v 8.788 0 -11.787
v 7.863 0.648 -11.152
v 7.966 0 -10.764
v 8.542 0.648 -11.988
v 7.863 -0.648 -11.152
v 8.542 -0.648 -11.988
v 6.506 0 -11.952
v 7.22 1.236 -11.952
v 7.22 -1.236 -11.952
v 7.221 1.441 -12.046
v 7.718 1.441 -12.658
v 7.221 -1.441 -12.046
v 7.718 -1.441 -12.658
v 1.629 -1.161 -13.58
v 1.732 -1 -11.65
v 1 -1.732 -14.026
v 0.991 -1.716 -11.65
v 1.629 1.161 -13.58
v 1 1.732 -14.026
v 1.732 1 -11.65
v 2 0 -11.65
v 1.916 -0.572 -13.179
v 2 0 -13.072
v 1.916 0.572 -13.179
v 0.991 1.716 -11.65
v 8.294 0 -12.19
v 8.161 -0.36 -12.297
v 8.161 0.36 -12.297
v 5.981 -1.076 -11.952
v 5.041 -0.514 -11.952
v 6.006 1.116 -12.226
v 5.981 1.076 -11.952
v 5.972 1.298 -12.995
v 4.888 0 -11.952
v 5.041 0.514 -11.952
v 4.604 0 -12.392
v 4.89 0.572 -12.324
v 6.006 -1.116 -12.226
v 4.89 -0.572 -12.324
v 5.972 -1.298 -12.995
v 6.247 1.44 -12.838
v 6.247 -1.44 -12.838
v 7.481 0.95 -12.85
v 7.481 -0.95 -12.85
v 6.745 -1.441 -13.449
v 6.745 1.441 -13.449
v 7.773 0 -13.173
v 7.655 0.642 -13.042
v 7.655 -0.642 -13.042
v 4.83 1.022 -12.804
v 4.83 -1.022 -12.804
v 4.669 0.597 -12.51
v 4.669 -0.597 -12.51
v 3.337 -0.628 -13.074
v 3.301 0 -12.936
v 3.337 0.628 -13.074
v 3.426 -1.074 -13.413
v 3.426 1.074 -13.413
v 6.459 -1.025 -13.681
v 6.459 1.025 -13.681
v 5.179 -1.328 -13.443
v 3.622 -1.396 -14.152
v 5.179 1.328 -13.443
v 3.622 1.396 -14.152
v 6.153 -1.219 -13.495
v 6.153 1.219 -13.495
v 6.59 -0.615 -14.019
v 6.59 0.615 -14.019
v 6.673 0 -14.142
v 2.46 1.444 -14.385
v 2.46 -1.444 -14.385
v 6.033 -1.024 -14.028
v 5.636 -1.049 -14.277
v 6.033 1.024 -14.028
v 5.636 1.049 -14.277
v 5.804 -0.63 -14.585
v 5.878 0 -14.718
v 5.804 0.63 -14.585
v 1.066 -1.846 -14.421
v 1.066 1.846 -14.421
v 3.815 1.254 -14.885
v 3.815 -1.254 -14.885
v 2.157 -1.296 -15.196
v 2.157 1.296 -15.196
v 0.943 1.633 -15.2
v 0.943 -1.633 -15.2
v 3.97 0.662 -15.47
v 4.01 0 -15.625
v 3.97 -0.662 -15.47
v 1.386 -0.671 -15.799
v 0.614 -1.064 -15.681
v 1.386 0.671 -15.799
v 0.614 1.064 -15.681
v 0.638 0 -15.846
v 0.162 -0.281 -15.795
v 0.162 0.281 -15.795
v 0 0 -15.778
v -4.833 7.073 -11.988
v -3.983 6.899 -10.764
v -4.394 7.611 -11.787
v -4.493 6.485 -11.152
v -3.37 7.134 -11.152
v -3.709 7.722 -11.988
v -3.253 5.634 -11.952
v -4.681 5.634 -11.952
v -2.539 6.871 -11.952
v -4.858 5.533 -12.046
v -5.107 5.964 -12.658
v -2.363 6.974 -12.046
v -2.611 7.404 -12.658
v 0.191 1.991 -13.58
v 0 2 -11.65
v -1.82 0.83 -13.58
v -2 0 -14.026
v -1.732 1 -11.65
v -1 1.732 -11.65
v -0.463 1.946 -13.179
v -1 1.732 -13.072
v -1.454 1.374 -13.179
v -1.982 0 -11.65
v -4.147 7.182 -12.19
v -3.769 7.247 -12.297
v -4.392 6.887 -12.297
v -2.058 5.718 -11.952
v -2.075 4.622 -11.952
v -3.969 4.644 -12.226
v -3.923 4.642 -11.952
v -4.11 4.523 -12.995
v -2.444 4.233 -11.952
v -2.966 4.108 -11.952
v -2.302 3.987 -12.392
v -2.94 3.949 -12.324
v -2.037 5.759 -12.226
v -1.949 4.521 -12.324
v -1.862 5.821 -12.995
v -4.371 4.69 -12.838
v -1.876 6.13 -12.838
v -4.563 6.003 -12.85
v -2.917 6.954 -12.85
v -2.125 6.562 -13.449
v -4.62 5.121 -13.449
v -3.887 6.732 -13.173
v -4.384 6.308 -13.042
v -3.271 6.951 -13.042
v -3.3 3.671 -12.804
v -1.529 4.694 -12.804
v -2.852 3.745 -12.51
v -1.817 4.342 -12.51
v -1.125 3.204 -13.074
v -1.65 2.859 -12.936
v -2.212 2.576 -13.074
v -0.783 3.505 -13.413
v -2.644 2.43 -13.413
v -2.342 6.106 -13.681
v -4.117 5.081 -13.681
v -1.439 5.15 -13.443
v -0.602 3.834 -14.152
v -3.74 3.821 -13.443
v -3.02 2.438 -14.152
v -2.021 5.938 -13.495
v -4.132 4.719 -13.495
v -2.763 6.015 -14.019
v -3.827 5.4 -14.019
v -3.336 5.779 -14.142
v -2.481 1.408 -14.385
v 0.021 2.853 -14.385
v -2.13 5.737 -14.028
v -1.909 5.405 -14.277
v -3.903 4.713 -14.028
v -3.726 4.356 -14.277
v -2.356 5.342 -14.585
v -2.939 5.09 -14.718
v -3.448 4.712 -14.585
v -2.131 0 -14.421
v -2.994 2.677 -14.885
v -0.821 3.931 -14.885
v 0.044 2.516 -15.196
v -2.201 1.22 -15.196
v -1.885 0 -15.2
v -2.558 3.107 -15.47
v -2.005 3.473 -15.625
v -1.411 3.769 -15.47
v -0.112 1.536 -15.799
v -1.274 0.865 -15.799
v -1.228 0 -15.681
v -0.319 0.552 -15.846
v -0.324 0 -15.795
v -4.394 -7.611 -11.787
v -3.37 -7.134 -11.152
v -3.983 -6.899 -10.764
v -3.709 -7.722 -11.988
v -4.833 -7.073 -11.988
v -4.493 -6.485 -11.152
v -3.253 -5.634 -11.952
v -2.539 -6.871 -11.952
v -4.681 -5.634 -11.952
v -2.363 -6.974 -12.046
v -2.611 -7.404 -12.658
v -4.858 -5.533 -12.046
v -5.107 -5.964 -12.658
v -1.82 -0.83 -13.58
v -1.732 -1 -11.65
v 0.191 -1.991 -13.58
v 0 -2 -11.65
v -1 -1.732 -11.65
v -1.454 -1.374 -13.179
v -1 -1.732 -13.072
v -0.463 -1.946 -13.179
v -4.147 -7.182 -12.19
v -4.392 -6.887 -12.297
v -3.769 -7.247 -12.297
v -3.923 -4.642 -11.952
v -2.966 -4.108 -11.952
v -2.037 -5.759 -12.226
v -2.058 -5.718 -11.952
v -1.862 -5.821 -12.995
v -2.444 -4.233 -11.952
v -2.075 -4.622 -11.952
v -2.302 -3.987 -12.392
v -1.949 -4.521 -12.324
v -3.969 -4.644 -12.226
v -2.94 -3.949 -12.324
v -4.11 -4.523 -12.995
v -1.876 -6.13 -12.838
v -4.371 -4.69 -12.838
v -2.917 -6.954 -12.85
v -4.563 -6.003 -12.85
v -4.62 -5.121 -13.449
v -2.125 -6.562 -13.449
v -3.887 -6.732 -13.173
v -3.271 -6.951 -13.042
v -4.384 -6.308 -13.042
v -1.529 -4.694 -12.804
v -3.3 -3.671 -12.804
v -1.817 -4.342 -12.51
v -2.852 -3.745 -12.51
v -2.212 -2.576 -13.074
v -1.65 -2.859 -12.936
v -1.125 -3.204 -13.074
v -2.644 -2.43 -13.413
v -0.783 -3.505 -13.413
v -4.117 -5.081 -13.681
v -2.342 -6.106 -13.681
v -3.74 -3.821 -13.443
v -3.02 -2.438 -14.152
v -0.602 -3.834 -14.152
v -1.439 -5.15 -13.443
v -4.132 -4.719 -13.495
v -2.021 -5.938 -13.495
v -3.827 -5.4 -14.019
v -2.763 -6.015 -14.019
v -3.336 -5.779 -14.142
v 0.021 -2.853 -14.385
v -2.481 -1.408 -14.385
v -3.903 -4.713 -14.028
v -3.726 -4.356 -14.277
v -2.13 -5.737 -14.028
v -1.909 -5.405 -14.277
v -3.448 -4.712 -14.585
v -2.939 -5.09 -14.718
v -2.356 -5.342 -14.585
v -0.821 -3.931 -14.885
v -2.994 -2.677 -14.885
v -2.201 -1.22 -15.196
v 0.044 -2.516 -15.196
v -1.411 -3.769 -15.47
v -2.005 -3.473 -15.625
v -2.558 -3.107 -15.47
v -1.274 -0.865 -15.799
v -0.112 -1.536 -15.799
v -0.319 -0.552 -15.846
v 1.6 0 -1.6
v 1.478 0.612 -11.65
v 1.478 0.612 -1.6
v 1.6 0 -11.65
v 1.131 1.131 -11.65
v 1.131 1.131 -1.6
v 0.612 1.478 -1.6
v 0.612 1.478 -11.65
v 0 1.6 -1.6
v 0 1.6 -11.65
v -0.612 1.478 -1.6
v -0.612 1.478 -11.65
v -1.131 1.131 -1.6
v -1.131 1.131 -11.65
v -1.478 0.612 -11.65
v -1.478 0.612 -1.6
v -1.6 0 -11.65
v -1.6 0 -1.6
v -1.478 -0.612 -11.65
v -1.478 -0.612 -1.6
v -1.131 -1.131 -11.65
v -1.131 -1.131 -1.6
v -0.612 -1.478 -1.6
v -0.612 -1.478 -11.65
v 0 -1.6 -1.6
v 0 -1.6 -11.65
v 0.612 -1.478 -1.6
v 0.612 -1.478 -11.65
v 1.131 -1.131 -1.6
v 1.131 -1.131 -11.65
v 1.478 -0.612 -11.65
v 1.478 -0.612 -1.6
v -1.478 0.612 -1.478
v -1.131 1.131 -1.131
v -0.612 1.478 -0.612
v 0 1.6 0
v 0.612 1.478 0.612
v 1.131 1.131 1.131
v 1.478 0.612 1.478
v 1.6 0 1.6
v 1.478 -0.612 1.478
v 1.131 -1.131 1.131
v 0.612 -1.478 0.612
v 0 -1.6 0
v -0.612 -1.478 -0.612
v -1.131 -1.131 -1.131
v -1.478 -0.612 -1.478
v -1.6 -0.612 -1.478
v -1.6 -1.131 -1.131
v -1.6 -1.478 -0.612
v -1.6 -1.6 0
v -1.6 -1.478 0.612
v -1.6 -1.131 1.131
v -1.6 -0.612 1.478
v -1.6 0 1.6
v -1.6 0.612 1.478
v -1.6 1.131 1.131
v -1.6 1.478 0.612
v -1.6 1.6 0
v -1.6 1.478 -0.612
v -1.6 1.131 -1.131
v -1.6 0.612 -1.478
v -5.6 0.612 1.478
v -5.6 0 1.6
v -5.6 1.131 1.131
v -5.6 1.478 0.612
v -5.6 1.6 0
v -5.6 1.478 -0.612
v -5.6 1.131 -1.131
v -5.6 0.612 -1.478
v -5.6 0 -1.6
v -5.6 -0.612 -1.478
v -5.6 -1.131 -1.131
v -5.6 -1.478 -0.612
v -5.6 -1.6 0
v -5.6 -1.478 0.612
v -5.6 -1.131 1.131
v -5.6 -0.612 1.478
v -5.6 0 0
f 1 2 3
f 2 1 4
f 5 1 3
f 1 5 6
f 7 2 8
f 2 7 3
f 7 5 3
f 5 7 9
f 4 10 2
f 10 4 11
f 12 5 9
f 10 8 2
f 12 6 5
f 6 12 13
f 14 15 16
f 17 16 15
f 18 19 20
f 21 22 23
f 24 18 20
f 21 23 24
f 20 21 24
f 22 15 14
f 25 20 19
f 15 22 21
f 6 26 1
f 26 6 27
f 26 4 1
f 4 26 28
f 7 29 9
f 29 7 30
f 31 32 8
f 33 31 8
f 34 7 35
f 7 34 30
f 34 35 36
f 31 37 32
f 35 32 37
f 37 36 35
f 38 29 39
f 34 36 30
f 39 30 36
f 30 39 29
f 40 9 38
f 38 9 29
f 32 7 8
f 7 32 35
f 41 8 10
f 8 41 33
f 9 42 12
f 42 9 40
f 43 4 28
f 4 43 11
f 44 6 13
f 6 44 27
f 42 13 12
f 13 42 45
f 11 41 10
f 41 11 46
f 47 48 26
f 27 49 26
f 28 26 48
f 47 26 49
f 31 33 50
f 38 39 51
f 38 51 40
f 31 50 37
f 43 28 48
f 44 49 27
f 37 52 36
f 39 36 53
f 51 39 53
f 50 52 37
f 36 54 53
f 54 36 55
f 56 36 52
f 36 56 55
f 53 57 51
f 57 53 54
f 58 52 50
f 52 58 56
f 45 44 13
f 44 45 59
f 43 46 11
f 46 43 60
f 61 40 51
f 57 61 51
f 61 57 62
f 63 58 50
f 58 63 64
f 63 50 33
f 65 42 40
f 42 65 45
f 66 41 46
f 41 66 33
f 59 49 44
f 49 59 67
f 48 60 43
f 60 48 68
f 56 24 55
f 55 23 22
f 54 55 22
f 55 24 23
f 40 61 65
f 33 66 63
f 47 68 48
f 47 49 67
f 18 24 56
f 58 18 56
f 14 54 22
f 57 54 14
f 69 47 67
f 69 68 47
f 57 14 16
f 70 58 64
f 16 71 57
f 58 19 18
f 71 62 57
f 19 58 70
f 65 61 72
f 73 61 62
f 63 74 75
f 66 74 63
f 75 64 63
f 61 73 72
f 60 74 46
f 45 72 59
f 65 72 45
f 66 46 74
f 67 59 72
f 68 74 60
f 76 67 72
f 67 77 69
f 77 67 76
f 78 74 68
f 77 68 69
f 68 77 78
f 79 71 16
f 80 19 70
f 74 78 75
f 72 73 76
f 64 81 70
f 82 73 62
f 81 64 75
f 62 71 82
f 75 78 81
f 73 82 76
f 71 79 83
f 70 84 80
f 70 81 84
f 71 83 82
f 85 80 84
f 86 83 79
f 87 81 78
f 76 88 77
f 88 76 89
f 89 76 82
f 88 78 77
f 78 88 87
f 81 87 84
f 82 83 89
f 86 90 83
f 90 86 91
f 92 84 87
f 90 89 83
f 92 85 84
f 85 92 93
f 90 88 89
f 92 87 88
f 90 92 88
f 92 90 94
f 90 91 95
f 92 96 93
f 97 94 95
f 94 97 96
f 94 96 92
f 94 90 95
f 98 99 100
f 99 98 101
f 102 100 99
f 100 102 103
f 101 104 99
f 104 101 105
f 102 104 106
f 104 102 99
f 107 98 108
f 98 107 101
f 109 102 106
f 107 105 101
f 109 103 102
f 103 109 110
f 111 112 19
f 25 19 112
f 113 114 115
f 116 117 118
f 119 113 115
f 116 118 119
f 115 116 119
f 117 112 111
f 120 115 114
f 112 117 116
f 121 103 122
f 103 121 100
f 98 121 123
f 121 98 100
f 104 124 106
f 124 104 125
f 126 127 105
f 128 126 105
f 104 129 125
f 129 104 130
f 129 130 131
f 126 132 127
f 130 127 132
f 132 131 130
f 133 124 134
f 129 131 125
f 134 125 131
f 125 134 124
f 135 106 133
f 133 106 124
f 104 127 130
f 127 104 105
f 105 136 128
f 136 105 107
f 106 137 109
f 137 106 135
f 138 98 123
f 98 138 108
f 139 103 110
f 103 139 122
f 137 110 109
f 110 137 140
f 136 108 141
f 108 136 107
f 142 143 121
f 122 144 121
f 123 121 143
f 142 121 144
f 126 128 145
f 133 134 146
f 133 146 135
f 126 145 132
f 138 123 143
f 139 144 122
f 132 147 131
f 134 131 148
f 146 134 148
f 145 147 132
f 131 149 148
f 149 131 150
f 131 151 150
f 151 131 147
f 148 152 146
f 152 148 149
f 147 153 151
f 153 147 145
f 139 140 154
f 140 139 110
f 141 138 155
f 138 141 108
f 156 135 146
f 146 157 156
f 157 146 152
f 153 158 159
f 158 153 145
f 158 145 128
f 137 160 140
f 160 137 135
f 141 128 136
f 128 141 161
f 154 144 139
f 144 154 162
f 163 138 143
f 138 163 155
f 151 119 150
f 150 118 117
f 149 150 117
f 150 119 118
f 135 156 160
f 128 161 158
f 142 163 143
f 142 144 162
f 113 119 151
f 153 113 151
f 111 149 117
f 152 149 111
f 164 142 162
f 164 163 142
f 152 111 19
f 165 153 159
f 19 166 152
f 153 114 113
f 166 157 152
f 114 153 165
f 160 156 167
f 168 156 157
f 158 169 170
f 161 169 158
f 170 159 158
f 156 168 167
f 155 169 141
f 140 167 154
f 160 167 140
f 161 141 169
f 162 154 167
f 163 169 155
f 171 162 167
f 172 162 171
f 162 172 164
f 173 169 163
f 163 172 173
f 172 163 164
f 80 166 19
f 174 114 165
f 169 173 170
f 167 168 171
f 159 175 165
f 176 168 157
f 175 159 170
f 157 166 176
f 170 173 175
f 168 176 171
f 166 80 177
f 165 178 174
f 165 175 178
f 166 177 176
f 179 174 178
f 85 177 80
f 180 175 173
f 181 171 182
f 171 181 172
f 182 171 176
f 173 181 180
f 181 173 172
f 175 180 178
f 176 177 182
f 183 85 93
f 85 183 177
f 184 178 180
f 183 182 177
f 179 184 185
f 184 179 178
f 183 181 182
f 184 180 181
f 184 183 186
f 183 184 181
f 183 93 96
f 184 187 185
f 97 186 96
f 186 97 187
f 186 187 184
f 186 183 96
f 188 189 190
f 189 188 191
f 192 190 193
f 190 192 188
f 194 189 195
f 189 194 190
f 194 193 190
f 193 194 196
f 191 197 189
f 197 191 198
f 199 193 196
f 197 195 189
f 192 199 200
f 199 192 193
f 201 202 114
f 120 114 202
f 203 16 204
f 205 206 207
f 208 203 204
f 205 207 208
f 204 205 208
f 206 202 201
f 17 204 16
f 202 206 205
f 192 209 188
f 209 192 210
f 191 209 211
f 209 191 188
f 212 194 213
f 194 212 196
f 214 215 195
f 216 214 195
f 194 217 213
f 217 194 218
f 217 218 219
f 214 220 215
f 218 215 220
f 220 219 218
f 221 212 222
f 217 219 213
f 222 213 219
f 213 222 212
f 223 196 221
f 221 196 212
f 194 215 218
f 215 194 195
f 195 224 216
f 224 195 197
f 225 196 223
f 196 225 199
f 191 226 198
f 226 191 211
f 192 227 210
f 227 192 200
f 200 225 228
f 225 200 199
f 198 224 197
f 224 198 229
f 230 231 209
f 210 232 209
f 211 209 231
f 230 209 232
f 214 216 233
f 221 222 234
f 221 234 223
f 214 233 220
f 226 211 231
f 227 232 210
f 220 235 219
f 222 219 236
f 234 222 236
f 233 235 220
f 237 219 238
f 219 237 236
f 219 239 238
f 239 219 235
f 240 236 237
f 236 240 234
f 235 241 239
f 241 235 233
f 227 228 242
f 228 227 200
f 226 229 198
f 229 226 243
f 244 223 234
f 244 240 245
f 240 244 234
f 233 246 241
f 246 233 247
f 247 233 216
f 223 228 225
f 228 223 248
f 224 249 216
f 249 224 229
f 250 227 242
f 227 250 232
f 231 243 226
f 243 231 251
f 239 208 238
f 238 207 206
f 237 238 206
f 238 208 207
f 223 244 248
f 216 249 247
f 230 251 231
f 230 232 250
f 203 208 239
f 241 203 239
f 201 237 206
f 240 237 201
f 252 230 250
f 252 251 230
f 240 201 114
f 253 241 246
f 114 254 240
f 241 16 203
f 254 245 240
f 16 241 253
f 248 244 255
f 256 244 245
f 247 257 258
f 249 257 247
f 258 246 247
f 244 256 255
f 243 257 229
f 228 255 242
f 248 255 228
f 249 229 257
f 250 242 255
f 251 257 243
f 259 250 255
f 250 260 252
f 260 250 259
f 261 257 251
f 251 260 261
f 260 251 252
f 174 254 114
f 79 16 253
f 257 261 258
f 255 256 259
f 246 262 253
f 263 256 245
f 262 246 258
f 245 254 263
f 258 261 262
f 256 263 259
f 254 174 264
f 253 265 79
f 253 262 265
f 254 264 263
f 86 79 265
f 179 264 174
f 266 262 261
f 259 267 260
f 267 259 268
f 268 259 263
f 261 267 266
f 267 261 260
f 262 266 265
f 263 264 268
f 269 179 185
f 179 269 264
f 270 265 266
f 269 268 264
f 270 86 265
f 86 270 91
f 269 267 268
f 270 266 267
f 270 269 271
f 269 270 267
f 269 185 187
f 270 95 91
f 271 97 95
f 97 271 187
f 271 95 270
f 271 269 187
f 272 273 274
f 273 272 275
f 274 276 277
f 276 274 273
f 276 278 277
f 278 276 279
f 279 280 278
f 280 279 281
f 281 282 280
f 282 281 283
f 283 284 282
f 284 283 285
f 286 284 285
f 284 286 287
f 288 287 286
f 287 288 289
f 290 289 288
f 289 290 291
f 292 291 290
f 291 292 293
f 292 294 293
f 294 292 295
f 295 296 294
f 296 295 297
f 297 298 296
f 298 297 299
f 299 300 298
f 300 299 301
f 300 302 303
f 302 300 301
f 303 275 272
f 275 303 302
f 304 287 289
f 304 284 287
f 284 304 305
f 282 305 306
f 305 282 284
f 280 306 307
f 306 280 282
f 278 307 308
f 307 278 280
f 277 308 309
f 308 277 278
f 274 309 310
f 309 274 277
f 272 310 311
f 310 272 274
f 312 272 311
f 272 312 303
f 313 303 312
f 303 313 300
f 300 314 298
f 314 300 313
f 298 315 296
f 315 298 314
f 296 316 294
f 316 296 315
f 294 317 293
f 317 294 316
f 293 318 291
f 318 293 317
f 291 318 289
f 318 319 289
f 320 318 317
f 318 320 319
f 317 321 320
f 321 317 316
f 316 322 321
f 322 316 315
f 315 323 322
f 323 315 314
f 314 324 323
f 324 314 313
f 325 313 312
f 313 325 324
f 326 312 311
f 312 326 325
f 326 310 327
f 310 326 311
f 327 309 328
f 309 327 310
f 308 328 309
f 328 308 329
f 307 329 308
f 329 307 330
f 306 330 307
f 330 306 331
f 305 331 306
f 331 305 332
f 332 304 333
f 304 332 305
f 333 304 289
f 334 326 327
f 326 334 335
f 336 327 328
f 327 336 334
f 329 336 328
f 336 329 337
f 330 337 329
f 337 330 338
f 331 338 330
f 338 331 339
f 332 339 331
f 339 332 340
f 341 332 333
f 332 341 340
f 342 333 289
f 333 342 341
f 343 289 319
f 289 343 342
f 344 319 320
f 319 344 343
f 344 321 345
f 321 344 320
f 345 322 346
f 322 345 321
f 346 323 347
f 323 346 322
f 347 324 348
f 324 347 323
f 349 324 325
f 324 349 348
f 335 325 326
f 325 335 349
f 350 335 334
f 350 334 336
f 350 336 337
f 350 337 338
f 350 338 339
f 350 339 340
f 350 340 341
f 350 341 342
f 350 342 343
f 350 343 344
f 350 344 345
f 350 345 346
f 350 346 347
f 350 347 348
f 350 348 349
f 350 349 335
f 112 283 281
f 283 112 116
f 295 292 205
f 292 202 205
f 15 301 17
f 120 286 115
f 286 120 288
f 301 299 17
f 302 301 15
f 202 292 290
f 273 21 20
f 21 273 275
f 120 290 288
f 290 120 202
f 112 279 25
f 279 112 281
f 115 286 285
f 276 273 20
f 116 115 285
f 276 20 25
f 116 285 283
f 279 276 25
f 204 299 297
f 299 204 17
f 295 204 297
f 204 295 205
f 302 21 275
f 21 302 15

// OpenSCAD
use <../lib.scad>
use <../p/4-4cyli.scad>
use <../p/4-4cyls.scad>
use <../p/4-4cylse.scad>
use <../p/4-4disc.scad>
use <../p/4-4edge.scad>
use <s/15534s01.scad>
function ldraw_lib__15534() = [
// 0 Minifig Tool Grappling Hook with Bar
// 0 Name: 15534.dat
// 0 Author: John Troxler [Gargan]
// 0 !LDRAW_ORG Part UPDATE 2026-01
// 0 !LICENSE Licensed under CC BY 4.0 : see CAreadme.txt
// 
// 0 BFC CERTIFY CCW
  [0,"BFC","CERTIFY"],
  [0,"BFC","CCW"],
// 
// 0 !CATEGORY Minifig Accessory
// 
// 0 !KEYWORDS Brickowl 17300
// 
// 0 !HISTORY 2014-05-16 {LEGO Digital Designer} Original part shape
// 0 !HISTORY 2017-04-24 [Gargan] File preparation for LDraw Parts Tracker
// 0 !HISTORY 2018-12-08 [PTadmin] Official Update 2018-02
// 0 !HISTORY 2020-10-23 [cwdee] Update description
// 0 !HISTORY 2020-12-29 [PTadmin] Official Update 2020-03
// 0 !HISTORY 2026-01-29 [OrionP] Minor header edits
// 0 !HISTORY 2026-01-29 [OrionP] Official Update 2026-01
// 
// 
// 1 16 0 4 0 1 0 0 0 1 0 0 0 1 s\15534s01.dat
  [1,16,0,4,0,1,0,0,0,1,0,0,0,1, ldraw_lib__s__15534s01()],
// 1 16 0 4 0 -0.5 0 -0.866025 0 1 0 0.866025 0 -0.5 s\15534s01.dat
  [1,16,0,4,0,-0.5,0,-0.866025,0,1,0,0.866025,0,-0.5, ldraw_lib__s__15534s01()],
// 1 16 0 4 0 -0.5 0 0.866025 0 1 0 -0.866025 0 -0.5 s\15534s01.dat
  [1,16,0,4,0,-0.5,0,0.866025,0,1,0,-0.866025,0,-0.5, ldraw_lib__s__15534s01()],
// 1 16 0 4 0 4 0 0 0 25.125 0 0 0 4 4-4cyli.dat
  [1,16,0,4,0,4,0,0,0,25.125,0,0,0,4, ldraw_lib__4_4cyli()],
// 1 16 0 4 0 -4 0 0 0 -4 0 0 0 4 4-4cylse.dat
  [1,16,0,4,0,-4,0,0,0,-4,0,0,0,4, ldraw_lib__4_4cylse()],
// 1 16 0 29.125 0 4 0 0 0 1 0 0 0 4 4-4edge.dat
  [1,16,0,29.125,0,4,0,0,0,1,0,0,0,4, ldraw_lib__4_4edge()],
// 1 16 -4 0 0 0 4 0 4 0 0 0 0 -4 4-4cyls.dat
  [1,16,-4,0,0,0,4,0,4,0,0,0,0,-4, ldraw_lib__4_4cyls()],
// 1 16 -14 0 0 0 10 0 -4 0 0 0 0 4 4-4cyli.dat
  [1,16,-14,0,0,0,10,0,-4,0,0,0,0,4, ldraw_lib__4_4cyli()],
// 1 16 -14 0 0 0 1 0 -4 0 0 0 0 4 4-4disc.dat
  [1,16,-14,0,0,0,1,0,-4,0,0,0,0,4, ldraw_lib__4_4disc()],
// 1 16 -14 0 0 0 1 0 -4 0 0 0 0 4 4-4edge.dat
  [1,16,-14,0,0,0,1,0,-4,0,0,0,0,4, ldraw_lib__4_4edge()],
// 4 16 0 29.125 5 -2.5 29.125 4.33 -1.531 29.125 3.696 0 29.125 4
  [4,16,0,29.125,5,-2.5,29.125,4.33,-1.531,29.125,3.696,0,29.125,4],
// 3 16 -1.531 29.125 -3.696 -2.828 29.125 -2.828 -2.5 29.125 -4.33
  [3,16,-1.531,29.125,-3.696,-2.828,29.125,-2.828,-2.5,29.125,-4.33],
// 3 16 -2.828 29.125 -2.828 -4.33 29.125 -2.5 -2.5 29.125 -4.33
  [3,16,-2.828,29.125,-2.828,-4.33,29.125,-2.5,-2.5,29.125,-4.33],
// 3 16 4.33 29.125 -2.5 2.828 29.125 -2.828 2.477 29.125 -4.291
  [3,16,4.33,29.125,-2.5,2.828,29.125,-2.828,2.477,29.125,-4.291],
// 4 16 -4.955 29.125 0 -4 29.125 0 -3.696 29.125 1.531 -4.33 29.125 2.5
  [4,16,-4.955,29.125,0,-4,29.125,0,-3.696,29.125,1.531,-4.33,29.125,2.5],
// 3 16 2.828 29.125 -2.828 1.531 29.125 -3.696 2.477 29.125 -4.291
  [3,16,2.828,29.125,-2.828,1.531,29.125,-3.696,2.477,29.125,-4.291],
// 3 16 3.696 29.125 -1.531 2.828 29.125 -2.828 4.33 29.125 -2.5
  [3,16,3.696,29.125,-1.531,2.828,29.125,-2.828,4.33,29.125,-2.5],
// 3 16 -4.33 29.125 -2.5 -2.828 29.125 -2.828 -3.696 29.125 -1.531
  [3,16,-4.33,29.125,-2.5,-2.828,29.125,-2.828,-3.696,29.125,-1.531],
// 4 16 3.696 29.125 1.531 4 29.125 0 5 29.125 0 4.33 29.125 2.5
  [4,16,3.696,29.125,1.531,4,29.125,0,5,29.125,0,4.33,29.125,2.5],
// 4 16 -4.955 29.125 0 -4.33 29.125 -2.5 -3.696 29.125 -1.531 -4 29.125 0
  [4,16,-4.955,29.125,0,-4.33,29.125,-2.5,-3.696,29.125,-1.531,-4,29.125,0],
// 4 16 0 29.125 5 0 29.125 4 1.531 29.125 3.696 2.477 29.125 4.291
  [4,16,0,29.125,5,0,29.125,4,1.531,29.125,3.696,2.477,29.125,4.291],
// 3 16 -4.33 29.125 2.5 -3.696 29.125 1.531 -2.828 29.125 2.828
  [3,16,-4.33,29.125,2.5,-3.696,29.125,1.531,-2.828,29.125,2.828],
// 3 16 2.828 29.125 2.828 3.696 29.125 1.531 4.33 29.125 2.5
  [3,16,2.828,29.125,2.828,3.696,29.125,1.531,4.33,29.125,2.5],
// 3 16 -2.5 29.125 4.33 -4.33 29.125 2.5 -2.828 29.125 2.828
  [3,16,-2.5,29.125,4.33,-4.33,29.125,2.5,-2.828,29.125,2.828],
// 3 16 2.828 29.125 2.828 4.33 29.125 2.5 2.477 29.125 4.291
  [3,16,2.828,29.125,2.828,4.33,29.125,2.5,2.477,29.125,4.291],
// 3 16 -2.5 29.125 4.33 -2.828 29.125 2.828 -1.531 29.125 3.696
  [3,16,-2.5,29.125,4.33,-2.828,29.125,2.828,-1.531,29.125,3.696],
// 3 16 1.531 29.125 3.696 2.828 29.125 2.828 2.477 29.125 4.291
  [3,16,1.531,29.125,3.696,2.828,29.125,2.828,2.477,29.125,4.291],
// 4 16 0 29.125 -4 0 29.125 -5 2.477 29.125 -4.291 1.531 29.125 -3.696
  [4,16,0,29.125,-4,0,29.125,-5,2.477,29.125,-4.291,1.531,29.125,-3.696],
// 4 16 -2.5 29.125 -4.33 0 29.125 -5 0 29.125 -4 -1.531 29.125 -3.696
  [4,16,-2.5,29.125,-4.33,0,29.125,-5,0,29.125,-4,-1.531,29.125,-3.696],
// 4 16 3.696 29.125 -1.531 4.33 29.125 -2.5 5 29.125 0 4 29.125 0
  [4,16,3.696,29.125,-1.531,4.33,29.125,-2.5,5,29.125,0,4,29.125,0],
];
module ldraw_lib__15534(step=0, col=false, unit=2/5, alt=false, line=0.2, solid=!$preview)
    makepoly(ldraw_lib__15534(), step=step, col=col, unit=unit, alt=alt, line=line, solid=solid);
ldraw_lib__15534(line=0.2);
